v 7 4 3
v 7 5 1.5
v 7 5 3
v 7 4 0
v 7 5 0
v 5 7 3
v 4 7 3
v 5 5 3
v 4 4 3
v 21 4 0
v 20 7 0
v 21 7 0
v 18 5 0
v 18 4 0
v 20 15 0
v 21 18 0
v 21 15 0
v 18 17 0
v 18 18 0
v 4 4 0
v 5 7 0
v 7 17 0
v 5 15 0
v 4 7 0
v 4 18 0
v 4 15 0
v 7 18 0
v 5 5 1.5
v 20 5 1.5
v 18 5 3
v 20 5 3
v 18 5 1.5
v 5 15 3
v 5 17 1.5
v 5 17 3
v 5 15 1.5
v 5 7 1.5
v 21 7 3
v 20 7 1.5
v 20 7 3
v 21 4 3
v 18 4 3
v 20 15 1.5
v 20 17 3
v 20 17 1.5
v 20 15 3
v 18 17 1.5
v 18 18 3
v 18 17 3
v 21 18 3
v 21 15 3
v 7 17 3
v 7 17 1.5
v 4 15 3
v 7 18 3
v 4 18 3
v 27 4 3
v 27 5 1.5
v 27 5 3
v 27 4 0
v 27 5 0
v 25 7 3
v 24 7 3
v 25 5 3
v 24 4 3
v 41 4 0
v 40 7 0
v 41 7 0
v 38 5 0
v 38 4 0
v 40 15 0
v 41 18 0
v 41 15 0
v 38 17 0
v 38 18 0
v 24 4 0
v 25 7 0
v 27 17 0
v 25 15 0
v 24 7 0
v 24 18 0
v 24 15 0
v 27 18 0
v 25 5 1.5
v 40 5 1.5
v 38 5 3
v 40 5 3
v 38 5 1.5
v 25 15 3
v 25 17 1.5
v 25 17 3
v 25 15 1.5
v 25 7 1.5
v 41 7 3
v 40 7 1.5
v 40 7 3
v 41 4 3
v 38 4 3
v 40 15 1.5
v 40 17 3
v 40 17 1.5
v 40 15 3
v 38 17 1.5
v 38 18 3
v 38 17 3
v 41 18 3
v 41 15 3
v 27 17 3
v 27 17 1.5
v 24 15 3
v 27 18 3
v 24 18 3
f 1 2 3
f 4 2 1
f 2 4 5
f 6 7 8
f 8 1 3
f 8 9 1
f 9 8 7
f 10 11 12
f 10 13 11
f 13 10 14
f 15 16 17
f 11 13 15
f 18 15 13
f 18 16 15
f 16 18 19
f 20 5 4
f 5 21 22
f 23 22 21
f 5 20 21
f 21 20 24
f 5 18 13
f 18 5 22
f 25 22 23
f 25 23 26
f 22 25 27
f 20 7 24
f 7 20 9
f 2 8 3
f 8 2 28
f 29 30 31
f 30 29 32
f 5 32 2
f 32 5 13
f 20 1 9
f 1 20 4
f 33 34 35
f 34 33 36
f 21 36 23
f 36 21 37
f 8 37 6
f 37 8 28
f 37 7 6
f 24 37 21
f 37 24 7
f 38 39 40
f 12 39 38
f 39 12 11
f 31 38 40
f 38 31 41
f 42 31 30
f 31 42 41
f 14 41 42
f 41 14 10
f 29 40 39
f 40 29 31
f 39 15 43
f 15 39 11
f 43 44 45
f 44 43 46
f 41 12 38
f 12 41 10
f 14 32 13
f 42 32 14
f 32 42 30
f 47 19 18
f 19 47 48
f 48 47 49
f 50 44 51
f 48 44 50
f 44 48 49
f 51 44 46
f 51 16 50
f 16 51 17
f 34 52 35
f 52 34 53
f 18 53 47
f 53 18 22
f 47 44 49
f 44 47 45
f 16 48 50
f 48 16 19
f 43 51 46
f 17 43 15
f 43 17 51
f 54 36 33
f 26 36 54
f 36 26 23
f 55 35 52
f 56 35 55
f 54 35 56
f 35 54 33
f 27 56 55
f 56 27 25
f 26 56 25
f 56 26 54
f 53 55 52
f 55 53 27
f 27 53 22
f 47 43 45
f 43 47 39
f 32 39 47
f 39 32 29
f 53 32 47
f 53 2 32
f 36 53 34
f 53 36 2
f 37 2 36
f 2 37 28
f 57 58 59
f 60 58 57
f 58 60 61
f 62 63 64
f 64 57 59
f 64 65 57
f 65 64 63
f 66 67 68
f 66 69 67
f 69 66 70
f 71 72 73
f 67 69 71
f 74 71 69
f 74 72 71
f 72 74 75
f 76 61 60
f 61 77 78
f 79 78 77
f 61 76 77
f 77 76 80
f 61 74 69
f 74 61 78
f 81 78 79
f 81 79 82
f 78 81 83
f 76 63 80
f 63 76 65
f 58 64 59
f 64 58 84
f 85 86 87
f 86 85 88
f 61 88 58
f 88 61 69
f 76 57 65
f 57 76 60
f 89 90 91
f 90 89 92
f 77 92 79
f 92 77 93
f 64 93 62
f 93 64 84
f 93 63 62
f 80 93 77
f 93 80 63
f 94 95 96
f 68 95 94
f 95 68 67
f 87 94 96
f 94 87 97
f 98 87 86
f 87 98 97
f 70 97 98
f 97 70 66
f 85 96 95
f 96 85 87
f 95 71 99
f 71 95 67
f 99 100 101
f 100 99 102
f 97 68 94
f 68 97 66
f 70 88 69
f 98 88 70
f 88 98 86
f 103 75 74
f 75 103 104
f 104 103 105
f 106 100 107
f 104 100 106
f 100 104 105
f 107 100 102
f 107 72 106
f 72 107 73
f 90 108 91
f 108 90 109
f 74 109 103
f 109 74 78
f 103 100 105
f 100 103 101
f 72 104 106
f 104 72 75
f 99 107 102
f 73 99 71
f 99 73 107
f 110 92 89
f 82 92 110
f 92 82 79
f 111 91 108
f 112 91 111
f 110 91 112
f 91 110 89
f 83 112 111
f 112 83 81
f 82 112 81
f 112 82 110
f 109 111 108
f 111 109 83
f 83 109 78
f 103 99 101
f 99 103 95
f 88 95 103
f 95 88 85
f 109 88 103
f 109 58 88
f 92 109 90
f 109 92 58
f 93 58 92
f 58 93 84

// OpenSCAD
// file: lib/corner_clips.scad
// 单个L形卡扣模块
module corner_clip(clip_length=2, thickness=1, arm_height=1) {
    // X方向臂
    cube([clip_length, thickness, arm_height]);
    // Y方向臂
    cube([thickness, clip_length, arm_height]);
}

// 四角卡扣模块
// chip_size: [长度, 宽度, 厚度]
// chip_pos: [x, y] 左下角位置
// clip_thickness: 卡扣臂厚度
// arm_height: 卡扣臂高度
// clip_length: 卡扣臂长度
module four_corner_clips(chip_size=[10,8,1.5], chip_pos=[0,0], 
                         clip_thickness=1, arm_height=1, clip_length=2) {
    chip_length = chip_size[0];
    chip_width  = chip_size[1];
    chip_thickness = chip_size[2];
    chip_x = chip_pos[0];
    chip_y = chip_pos[1];

    // 左下角
    translate([chip_x - clip_thickness, chip_y - clip_thickness, 0])
        corner_clip(clip_length, clip_thickness, arm_height);

    // 右下角
    translate([chip_x + chip_length + clip_thickness, chip_y - clip_thickness, 0])
        rotate([0,0,90])
        corner_clip(clip_length, clip_thickness, arm_height);

    // 右上角
    translate([chip_x + chip_length + clip_thickness , chip_y + chip_width + clip_thickness , 0])
        rotate([0,0,180])
        corner_clip(clip_length, clip_thickness, arm_height);

    // 左上角
    translate([chip_x - clip_thickness, chip_y + chip_width + clip_thickness, 0])
        rotate([0,0,270])
        corner_clip(clip_length, clip_thickness, arm_height);

    // 芯片
    color("blue", 0.3)
    translate([chip_x, chip_y, 0])
        cube([chip_length, chip_width, chip_thickness]);
}
// main file
use <lib/corner_clips.scad>;

clip_thickness = 1;
arm_height = 3;

// 调用示例
four_corner_clips(
    chip_size=[15, 12, 1.5],
    chip_pos=[5, 5],
    clip_thickness=clip_thickness,
    arm_height=arm_height,
    clip_length=3
);


four_corner_clips(
    chip_size=[15, 12, 1.5],
    chip_pos=[25, 5],
    
    clip_thickness=clip_thickness,
    arm_height=arm_height,
    clip_length=3
);
